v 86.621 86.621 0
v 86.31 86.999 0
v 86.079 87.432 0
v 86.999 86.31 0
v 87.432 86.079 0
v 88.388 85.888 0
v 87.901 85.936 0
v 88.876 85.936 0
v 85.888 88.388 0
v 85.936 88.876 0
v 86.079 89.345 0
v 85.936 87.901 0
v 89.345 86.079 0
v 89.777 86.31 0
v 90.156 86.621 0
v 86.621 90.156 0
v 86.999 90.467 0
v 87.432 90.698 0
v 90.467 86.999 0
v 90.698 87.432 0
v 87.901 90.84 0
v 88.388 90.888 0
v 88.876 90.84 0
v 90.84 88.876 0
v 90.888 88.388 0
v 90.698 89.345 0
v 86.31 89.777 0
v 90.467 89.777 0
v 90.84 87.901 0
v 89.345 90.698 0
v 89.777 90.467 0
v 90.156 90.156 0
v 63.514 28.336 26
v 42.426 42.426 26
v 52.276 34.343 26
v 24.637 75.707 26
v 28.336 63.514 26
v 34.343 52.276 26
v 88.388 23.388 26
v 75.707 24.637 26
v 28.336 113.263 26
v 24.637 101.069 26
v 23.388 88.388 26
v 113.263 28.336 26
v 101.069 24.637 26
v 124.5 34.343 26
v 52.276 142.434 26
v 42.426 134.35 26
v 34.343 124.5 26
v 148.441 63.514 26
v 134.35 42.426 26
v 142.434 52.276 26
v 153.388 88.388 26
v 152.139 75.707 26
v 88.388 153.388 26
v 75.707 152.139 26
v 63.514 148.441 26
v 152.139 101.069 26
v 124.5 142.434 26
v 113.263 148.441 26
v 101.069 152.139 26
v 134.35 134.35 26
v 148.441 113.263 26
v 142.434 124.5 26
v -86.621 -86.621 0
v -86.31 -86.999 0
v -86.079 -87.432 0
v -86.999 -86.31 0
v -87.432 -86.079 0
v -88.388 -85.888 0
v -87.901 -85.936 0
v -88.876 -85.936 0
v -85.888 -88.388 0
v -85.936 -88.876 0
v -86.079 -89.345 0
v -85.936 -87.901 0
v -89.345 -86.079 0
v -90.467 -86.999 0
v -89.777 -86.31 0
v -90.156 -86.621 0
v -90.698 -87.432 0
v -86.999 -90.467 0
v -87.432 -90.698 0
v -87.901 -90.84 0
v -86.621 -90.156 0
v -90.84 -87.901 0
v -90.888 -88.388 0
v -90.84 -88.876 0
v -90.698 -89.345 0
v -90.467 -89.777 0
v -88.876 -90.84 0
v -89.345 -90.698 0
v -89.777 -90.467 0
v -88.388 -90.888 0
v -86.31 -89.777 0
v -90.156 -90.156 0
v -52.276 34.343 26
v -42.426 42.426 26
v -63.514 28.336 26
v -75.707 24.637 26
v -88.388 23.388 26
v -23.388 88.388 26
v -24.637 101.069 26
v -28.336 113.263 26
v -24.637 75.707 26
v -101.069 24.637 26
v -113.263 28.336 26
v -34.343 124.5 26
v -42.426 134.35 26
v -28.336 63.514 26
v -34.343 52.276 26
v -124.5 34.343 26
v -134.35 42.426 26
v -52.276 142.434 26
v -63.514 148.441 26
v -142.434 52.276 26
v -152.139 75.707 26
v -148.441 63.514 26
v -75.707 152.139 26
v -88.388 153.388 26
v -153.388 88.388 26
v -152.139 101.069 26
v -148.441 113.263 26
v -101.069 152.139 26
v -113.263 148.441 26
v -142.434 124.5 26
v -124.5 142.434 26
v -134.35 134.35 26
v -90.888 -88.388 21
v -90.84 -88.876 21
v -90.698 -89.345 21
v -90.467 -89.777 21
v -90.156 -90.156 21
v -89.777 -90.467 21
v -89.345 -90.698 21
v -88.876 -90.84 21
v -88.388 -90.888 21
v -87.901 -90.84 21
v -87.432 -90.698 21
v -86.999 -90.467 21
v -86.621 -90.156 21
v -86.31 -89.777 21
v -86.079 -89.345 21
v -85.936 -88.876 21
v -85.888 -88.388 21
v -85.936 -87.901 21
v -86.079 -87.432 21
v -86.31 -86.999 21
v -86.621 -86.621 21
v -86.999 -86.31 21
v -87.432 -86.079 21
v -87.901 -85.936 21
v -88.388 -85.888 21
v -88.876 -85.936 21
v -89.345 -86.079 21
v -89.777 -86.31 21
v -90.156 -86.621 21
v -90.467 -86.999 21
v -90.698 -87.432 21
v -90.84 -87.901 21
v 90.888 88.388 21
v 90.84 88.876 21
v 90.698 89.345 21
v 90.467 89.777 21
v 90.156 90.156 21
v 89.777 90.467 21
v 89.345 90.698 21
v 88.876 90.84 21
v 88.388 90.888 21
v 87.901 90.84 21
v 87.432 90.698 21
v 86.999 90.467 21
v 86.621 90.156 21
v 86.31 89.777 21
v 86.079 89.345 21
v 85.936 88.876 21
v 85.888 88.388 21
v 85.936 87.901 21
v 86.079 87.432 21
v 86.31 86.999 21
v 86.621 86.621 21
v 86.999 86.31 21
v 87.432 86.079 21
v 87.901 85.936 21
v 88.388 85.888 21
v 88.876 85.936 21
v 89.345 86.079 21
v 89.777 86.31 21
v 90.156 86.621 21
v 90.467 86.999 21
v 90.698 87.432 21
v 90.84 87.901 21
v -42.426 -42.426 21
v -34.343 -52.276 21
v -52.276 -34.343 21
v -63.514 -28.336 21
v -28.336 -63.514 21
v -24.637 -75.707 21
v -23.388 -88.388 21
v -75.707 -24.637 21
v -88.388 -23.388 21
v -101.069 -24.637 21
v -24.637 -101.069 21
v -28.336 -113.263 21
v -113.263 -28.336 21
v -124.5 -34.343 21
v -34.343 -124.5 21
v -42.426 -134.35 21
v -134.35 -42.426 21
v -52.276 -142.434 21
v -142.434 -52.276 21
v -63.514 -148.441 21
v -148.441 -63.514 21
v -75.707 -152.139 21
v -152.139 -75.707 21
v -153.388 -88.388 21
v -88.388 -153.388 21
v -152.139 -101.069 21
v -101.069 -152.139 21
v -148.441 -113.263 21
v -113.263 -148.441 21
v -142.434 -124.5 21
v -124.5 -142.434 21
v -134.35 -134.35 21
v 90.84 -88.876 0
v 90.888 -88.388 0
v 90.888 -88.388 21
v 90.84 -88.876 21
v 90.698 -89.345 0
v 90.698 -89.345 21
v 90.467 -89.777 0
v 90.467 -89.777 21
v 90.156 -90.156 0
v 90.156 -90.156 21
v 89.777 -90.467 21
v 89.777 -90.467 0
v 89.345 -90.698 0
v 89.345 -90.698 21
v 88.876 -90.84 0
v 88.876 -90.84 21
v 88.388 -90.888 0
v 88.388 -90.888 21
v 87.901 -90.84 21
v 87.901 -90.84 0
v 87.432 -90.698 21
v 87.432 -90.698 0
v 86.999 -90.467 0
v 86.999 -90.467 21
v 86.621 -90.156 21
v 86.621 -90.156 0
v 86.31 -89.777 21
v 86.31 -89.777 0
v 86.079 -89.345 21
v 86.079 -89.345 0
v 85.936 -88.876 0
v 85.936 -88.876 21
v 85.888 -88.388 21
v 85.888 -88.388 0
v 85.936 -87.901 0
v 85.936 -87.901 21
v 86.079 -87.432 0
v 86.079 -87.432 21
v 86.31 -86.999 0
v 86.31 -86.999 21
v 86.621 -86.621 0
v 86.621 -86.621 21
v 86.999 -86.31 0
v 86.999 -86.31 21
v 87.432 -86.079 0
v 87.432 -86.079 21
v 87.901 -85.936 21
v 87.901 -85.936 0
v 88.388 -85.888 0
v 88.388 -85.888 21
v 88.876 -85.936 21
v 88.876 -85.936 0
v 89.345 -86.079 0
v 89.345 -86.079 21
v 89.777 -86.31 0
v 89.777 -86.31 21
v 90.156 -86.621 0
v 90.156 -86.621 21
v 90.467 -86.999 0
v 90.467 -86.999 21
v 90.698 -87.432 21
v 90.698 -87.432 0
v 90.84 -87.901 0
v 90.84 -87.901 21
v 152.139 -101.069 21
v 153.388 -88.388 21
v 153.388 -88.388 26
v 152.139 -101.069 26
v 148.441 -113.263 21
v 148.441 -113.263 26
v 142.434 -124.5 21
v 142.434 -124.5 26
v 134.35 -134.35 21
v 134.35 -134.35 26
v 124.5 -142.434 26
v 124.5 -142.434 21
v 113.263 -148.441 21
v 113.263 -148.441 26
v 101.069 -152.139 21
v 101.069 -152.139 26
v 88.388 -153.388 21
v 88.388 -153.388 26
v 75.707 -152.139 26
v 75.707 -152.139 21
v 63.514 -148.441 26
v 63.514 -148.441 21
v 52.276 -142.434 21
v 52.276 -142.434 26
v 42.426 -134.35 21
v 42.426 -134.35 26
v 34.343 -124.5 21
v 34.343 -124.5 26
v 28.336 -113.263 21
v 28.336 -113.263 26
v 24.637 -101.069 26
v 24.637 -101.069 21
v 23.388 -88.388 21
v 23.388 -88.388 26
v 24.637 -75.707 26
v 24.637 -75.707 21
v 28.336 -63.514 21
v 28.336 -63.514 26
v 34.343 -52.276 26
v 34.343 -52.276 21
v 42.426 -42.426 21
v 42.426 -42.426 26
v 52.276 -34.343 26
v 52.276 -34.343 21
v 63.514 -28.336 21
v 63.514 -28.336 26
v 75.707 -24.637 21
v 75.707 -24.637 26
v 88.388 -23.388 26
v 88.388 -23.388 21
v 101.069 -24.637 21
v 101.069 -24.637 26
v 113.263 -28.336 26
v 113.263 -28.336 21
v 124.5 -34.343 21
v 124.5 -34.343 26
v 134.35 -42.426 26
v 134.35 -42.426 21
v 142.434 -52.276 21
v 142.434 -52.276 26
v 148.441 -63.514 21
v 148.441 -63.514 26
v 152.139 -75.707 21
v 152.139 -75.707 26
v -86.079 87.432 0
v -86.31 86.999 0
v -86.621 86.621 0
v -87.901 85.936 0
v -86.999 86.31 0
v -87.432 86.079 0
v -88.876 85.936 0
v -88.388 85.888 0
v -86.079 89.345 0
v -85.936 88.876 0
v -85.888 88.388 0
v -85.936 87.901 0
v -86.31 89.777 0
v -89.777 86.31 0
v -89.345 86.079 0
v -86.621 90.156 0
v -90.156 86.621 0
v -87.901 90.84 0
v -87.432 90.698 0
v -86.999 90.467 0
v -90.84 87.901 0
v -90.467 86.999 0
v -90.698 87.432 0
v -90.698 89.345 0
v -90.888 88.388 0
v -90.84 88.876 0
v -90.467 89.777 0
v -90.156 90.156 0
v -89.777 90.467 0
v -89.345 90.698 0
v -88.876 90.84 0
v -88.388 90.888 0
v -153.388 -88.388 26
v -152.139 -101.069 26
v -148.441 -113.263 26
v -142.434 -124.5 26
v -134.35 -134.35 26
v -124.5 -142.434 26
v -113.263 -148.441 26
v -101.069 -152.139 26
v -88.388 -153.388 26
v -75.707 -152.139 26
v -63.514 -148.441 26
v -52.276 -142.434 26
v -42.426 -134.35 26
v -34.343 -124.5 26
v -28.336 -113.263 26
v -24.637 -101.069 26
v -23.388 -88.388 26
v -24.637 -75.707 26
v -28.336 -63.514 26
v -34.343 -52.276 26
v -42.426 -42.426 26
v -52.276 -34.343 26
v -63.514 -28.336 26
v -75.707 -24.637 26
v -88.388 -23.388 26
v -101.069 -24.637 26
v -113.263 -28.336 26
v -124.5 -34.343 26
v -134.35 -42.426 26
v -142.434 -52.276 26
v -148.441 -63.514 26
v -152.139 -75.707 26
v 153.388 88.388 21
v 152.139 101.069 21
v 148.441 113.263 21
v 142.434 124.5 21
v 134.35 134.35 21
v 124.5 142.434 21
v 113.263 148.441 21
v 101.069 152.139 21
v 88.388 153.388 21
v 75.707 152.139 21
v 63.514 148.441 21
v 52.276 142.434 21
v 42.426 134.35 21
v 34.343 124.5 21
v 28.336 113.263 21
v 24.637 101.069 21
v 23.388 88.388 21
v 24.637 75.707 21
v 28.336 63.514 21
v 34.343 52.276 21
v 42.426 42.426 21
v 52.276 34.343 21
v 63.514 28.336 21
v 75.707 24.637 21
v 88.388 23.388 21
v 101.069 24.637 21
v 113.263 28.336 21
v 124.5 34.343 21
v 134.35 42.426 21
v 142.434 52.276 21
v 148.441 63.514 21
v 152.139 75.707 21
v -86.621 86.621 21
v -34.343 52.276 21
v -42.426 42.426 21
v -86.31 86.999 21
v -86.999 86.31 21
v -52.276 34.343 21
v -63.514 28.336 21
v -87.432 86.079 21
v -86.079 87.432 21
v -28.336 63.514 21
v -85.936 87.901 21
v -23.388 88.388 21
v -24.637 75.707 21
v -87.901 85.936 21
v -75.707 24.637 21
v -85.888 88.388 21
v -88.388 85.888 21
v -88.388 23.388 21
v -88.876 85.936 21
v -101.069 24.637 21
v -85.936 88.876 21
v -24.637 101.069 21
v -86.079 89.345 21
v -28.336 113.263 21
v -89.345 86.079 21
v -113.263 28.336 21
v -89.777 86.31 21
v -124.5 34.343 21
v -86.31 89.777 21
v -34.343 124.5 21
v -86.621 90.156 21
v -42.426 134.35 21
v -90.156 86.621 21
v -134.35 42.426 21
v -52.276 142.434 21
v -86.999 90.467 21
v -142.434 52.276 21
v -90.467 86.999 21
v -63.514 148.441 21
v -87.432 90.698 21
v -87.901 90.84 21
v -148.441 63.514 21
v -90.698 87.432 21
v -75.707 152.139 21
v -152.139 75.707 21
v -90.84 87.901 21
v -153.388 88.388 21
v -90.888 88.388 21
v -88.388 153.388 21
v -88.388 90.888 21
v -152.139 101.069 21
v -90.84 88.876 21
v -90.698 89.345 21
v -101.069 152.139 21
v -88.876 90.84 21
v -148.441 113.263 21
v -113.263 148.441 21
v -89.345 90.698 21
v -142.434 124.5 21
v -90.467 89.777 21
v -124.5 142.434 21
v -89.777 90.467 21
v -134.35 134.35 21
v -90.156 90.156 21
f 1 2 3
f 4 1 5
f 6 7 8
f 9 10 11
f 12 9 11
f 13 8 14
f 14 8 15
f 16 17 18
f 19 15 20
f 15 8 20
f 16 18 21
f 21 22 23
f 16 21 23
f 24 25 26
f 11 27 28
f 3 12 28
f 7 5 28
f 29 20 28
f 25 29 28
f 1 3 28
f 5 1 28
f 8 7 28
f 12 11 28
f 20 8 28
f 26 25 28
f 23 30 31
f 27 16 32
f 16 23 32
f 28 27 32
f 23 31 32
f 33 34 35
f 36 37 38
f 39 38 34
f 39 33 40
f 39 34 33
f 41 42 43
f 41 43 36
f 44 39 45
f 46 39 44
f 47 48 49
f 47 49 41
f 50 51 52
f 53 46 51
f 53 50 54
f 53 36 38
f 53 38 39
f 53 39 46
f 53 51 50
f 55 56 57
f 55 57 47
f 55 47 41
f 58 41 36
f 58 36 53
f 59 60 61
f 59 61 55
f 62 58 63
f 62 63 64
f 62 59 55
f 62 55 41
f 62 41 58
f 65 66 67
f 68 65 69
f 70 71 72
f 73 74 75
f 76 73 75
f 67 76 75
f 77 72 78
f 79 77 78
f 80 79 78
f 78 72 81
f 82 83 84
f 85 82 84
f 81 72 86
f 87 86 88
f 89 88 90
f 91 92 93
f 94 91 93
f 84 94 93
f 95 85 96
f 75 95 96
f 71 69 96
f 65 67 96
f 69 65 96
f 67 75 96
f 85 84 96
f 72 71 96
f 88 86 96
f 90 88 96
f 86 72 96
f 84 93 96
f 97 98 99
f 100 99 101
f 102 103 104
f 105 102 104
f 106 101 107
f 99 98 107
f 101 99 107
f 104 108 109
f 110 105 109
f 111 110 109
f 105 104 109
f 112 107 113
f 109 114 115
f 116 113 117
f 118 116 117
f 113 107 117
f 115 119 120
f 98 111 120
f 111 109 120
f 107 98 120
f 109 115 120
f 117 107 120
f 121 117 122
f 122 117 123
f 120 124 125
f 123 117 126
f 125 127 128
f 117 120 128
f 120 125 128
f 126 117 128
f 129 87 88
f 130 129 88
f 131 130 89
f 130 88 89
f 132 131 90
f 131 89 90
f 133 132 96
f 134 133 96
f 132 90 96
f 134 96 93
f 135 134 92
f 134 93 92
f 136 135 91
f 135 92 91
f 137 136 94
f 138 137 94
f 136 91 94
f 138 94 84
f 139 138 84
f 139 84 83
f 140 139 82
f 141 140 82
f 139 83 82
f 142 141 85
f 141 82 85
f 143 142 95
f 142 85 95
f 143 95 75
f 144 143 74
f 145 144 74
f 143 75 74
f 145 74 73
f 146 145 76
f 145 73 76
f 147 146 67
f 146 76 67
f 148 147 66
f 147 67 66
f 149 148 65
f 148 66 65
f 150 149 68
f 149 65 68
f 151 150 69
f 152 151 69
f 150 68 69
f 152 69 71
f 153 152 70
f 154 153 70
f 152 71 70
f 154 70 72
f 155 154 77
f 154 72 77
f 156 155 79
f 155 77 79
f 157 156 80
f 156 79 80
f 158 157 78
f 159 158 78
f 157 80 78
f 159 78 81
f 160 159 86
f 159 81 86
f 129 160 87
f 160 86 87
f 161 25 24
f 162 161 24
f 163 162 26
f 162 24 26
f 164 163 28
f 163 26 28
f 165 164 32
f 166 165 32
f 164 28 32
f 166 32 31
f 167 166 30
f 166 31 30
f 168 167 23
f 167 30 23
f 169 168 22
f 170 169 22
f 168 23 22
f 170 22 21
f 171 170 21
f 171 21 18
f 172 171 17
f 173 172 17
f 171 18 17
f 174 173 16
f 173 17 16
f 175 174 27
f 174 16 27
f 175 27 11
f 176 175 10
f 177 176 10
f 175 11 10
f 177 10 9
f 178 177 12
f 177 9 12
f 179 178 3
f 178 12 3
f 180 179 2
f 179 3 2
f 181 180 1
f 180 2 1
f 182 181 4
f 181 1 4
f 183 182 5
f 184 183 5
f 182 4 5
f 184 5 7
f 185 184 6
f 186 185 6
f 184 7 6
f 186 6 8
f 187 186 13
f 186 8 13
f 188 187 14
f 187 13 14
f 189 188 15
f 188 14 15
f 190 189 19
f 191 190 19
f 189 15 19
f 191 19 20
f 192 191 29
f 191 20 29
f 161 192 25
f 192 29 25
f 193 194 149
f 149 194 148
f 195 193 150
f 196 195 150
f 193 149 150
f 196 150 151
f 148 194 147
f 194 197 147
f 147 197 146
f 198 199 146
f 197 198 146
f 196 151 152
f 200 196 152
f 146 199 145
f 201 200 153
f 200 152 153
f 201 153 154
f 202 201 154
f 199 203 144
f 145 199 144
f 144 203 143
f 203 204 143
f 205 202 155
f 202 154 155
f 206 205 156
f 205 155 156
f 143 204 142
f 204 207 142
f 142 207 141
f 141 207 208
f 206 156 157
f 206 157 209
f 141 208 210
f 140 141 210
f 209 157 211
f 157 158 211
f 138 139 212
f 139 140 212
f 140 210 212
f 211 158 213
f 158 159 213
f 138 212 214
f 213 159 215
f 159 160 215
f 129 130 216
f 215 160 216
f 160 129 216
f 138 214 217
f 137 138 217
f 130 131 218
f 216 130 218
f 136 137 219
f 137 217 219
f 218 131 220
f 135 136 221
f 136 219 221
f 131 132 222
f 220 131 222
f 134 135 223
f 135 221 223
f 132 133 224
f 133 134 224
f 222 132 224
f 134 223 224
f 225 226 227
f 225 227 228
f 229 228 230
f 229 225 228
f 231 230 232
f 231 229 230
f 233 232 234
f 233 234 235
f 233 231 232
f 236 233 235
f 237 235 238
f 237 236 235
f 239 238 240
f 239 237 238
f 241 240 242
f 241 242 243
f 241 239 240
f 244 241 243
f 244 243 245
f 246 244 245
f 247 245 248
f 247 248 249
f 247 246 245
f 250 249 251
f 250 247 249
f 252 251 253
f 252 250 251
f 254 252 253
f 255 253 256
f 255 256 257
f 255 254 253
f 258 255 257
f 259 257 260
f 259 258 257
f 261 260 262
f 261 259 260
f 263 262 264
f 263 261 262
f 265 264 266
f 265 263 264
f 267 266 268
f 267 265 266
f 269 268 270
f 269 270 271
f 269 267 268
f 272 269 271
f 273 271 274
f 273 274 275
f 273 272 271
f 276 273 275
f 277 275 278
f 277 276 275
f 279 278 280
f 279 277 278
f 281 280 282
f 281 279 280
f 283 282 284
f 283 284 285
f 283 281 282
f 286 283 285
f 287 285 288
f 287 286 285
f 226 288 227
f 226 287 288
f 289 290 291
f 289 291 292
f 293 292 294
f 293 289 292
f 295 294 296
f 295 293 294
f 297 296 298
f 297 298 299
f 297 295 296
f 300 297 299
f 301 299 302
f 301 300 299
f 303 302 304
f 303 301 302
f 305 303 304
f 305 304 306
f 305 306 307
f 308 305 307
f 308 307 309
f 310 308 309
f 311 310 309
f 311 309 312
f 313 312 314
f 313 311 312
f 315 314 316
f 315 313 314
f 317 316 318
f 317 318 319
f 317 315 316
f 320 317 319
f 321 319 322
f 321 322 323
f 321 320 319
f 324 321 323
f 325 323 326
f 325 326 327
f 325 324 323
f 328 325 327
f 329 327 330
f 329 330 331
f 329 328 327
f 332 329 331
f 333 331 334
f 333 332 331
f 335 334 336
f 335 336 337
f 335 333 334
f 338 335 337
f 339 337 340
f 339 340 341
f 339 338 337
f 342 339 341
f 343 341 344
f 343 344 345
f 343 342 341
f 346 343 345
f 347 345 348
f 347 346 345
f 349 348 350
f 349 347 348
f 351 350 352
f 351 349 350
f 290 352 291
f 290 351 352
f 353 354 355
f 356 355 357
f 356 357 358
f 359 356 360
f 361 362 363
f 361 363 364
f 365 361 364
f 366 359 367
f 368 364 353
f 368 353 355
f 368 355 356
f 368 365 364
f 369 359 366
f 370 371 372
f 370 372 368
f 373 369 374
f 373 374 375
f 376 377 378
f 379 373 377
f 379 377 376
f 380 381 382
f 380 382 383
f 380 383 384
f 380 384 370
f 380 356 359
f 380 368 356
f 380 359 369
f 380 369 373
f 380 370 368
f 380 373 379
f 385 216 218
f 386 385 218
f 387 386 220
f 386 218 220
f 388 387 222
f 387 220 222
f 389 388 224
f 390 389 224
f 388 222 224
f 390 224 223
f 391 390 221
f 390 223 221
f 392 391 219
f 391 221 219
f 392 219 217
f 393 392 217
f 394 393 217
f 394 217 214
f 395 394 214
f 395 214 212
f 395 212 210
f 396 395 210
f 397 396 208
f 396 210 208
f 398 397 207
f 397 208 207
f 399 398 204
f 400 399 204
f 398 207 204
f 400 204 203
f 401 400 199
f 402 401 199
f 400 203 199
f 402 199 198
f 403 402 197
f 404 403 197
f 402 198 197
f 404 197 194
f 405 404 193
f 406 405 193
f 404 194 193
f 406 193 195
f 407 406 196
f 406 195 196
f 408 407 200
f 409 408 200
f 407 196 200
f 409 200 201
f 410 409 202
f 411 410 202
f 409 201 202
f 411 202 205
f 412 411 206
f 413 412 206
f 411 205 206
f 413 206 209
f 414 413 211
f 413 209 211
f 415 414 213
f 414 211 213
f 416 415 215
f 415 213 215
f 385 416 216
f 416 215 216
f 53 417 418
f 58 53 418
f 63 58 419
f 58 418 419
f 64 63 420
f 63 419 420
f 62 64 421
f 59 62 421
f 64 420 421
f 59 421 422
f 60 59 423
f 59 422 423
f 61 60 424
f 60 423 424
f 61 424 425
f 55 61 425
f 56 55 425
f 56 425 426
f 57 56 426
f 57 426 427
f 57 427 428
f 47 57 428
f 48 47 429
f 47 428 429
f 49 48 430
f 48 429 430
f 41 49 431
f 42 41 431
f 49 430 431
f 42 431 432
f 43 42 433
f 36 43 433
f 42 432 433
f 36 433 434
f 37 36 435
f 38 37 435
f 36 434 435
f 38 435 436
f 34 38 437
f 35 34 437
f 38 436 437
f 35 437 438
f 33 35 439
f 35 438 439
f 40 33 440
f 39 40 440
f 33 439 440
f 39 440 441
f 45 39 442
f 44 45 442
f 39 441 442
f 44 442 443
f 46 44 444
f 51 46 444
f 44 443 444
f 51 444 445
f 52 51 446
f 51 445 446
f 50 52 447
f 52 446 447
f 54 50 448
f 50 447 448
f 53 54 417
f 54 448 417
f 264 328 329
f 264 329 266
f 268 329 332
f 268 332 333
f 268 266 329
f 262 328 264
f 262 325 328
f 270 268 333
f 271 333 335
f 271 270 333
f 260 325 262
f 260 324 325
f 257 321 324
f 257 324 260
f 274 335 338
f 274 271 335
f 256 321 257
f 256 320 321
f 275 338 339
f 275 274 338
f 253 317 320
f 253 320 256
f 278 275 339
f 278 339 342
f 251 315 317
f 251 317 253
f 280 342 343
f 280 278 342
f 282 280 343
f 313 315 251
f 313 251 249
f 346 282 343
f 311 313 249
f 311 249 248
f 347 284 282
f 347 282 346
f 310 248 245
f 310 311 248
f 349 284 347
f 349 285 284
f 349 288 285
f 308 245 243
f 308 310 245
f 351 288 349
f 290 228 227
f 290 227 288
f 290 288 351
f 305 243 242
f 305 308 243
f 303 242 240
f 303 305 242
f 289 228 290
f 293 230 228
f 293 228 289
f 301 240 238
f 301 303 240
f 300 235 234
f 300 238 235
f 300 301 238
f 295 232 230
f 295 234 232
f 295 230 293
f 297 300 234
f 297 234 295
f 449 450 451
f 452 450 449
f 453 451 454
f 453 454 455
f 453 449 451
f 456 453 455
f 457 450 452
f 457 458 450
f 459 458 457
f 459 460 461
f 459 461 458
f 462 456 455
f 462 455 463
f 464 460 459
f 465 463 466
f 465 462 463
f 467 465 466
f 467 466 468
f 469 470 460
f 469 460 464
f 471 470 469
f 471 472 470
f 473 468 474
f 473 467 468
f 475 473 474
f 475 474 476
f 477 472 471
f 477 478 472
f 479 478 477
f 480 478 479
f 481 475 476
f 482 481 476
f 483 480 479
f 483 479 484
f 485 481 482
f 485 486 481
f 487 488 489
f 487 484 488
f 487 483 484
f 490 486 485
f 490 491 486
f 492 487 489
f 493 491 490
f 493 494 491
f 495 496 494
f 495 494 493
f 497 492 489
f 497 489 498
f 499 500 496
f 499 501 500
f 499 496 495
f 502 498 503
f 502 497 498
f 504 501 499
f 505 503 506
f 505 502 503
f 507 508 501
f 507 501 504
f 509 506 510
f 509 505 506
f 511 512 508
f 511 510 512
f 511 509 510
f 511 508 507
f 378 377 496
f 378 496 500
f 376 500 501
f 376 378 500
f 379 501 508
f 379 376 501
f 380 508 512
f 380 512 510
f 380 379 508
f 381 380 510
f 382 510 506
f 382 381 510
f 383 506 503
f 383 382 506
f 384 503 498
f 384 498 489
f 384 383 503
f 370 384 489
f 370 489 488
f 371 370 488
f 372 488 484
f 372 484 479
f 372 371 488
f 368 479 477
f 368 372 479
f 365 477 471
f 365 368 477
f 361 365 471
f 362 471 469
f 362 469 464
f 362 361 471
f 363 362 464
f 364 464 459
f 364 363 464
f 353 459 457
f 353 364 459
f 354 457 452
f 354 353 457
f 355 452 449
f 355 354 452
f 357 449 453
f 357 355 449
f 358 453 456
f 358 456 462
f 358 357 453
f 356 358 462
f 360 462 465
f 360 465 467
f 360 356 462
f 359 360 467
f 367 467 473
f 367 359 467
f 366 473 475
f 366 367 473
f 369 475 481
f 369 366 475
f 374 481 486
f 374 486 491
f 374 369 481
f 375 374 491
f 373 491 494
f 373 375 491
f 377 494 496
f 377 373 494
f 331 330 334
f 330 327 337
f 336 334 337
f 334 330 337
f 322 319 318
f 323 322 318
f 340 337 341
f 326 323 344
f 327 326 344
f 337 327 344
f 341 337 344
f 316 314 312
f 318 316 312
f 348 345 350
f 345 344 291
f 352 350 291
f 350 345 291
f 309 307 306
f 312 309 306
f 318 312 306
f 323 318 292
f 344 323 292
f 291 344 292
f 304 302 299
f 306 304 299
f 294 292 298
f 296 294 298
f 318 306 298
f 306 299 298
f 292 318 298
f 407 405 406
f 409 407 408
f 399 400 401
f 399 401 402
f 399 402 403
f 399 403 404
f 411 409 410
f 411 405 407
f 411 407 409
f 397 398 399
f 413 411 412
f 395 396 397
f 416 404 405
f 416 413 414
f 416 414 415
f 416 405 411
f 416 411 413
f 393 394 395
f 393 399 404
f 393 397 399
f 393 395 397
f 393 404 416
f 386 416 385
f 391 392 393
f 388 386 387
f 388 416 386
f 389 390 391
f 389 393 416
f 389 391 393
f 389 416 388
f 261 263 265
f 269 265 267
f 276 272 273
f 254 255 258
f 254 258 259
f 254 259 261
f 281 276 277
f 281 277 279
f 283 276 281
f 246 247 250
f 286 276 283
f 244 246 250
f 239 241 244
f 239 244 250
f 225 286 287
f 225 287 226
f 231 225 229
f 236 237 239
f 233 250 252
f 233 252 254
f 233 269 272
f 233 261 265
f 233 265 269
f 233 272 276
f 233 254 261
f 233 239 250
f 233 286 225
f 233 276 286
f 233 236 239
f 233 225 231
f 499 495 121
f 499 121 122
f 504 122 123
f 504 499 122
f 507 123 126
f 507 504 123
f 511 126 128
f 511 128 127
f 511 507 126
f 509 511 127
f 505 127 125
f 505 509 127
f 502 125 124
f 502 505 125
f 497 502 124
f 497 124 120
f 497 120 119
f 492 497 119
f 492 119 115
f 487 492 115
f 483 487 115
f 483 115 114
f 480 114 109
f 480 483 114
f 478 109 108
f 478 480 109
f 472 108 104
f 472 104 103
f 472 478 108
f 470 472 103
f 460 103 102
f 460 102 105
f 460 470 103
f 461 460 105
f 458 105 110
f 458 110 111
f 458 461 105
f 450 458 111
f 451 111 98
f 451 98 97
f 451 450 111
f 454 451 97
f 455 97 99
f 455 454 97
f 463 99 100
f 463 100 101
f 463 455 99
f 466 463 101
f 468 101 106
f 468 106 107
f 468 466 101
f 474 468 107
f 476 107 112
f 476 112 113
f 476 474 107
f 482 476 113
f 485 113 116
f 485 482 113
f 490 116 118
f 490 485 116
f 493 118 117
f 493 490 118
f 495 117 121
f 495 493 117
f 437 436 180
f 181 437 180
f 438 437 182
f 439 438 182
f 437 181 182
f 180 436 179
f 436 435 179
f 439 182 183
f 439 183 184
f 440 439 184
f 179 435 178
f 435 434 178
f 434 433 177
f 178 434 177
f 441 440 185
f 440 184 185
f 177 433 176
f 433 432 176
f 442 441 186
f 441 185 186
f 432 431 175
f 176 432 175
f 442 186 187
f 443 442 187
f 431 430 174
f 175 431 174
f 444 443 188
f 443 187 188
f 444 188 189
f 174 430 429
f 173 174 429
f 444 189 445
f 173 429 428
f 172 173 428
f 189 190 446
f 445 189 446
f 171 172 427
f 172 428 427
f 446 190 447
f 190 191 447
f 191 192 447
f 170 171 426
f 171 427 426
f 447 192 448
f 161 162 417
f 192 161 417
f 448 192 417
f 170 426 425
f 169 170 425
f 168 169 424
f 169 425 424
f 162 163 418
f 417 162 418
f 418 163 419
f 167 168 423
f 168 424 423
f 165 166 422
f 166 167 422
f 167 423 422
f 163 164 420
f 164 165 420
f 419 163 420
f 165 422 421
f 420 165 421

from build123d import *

# Parameters (mm, degrees)
F0_R     = 2.5
F1_DEPTH = 21
F2_R     = 65
F3_DEPTH = 5


with BuildPart() as f1:
    # F0 (on Top) → F1 (new body)
    with BuildSketch(Plane.XY):
        with Locations((88.388348, 88.388348)):
            Circle(F0_R)
    extrude(amount=F1_DEPTH)

    # F2 (on face) → F3 (join)
    with BuildSketch(Plane.XY.offset(21)):
        with Locations((88.388348, 88.388348)):
            Circle(F2_R)
    extrude(amount=F3_DEPTH)


with BuildPart() as f4_1:
    # F4: instance of F1
    add(f1.part.mirror(Plane.YZ))


with BuildPart() as f5_1:
    # F5: instance of F4_1
    add(f4_1.part.mirror(Plane.XZ))


with BuildPart() as f5_2:
    # F5: instance of F1
    add(f1.part.mirror(Plane.XZ))


solid = Compound([f1.part, f4_1.part, f5_1.part, f5_2.part])
